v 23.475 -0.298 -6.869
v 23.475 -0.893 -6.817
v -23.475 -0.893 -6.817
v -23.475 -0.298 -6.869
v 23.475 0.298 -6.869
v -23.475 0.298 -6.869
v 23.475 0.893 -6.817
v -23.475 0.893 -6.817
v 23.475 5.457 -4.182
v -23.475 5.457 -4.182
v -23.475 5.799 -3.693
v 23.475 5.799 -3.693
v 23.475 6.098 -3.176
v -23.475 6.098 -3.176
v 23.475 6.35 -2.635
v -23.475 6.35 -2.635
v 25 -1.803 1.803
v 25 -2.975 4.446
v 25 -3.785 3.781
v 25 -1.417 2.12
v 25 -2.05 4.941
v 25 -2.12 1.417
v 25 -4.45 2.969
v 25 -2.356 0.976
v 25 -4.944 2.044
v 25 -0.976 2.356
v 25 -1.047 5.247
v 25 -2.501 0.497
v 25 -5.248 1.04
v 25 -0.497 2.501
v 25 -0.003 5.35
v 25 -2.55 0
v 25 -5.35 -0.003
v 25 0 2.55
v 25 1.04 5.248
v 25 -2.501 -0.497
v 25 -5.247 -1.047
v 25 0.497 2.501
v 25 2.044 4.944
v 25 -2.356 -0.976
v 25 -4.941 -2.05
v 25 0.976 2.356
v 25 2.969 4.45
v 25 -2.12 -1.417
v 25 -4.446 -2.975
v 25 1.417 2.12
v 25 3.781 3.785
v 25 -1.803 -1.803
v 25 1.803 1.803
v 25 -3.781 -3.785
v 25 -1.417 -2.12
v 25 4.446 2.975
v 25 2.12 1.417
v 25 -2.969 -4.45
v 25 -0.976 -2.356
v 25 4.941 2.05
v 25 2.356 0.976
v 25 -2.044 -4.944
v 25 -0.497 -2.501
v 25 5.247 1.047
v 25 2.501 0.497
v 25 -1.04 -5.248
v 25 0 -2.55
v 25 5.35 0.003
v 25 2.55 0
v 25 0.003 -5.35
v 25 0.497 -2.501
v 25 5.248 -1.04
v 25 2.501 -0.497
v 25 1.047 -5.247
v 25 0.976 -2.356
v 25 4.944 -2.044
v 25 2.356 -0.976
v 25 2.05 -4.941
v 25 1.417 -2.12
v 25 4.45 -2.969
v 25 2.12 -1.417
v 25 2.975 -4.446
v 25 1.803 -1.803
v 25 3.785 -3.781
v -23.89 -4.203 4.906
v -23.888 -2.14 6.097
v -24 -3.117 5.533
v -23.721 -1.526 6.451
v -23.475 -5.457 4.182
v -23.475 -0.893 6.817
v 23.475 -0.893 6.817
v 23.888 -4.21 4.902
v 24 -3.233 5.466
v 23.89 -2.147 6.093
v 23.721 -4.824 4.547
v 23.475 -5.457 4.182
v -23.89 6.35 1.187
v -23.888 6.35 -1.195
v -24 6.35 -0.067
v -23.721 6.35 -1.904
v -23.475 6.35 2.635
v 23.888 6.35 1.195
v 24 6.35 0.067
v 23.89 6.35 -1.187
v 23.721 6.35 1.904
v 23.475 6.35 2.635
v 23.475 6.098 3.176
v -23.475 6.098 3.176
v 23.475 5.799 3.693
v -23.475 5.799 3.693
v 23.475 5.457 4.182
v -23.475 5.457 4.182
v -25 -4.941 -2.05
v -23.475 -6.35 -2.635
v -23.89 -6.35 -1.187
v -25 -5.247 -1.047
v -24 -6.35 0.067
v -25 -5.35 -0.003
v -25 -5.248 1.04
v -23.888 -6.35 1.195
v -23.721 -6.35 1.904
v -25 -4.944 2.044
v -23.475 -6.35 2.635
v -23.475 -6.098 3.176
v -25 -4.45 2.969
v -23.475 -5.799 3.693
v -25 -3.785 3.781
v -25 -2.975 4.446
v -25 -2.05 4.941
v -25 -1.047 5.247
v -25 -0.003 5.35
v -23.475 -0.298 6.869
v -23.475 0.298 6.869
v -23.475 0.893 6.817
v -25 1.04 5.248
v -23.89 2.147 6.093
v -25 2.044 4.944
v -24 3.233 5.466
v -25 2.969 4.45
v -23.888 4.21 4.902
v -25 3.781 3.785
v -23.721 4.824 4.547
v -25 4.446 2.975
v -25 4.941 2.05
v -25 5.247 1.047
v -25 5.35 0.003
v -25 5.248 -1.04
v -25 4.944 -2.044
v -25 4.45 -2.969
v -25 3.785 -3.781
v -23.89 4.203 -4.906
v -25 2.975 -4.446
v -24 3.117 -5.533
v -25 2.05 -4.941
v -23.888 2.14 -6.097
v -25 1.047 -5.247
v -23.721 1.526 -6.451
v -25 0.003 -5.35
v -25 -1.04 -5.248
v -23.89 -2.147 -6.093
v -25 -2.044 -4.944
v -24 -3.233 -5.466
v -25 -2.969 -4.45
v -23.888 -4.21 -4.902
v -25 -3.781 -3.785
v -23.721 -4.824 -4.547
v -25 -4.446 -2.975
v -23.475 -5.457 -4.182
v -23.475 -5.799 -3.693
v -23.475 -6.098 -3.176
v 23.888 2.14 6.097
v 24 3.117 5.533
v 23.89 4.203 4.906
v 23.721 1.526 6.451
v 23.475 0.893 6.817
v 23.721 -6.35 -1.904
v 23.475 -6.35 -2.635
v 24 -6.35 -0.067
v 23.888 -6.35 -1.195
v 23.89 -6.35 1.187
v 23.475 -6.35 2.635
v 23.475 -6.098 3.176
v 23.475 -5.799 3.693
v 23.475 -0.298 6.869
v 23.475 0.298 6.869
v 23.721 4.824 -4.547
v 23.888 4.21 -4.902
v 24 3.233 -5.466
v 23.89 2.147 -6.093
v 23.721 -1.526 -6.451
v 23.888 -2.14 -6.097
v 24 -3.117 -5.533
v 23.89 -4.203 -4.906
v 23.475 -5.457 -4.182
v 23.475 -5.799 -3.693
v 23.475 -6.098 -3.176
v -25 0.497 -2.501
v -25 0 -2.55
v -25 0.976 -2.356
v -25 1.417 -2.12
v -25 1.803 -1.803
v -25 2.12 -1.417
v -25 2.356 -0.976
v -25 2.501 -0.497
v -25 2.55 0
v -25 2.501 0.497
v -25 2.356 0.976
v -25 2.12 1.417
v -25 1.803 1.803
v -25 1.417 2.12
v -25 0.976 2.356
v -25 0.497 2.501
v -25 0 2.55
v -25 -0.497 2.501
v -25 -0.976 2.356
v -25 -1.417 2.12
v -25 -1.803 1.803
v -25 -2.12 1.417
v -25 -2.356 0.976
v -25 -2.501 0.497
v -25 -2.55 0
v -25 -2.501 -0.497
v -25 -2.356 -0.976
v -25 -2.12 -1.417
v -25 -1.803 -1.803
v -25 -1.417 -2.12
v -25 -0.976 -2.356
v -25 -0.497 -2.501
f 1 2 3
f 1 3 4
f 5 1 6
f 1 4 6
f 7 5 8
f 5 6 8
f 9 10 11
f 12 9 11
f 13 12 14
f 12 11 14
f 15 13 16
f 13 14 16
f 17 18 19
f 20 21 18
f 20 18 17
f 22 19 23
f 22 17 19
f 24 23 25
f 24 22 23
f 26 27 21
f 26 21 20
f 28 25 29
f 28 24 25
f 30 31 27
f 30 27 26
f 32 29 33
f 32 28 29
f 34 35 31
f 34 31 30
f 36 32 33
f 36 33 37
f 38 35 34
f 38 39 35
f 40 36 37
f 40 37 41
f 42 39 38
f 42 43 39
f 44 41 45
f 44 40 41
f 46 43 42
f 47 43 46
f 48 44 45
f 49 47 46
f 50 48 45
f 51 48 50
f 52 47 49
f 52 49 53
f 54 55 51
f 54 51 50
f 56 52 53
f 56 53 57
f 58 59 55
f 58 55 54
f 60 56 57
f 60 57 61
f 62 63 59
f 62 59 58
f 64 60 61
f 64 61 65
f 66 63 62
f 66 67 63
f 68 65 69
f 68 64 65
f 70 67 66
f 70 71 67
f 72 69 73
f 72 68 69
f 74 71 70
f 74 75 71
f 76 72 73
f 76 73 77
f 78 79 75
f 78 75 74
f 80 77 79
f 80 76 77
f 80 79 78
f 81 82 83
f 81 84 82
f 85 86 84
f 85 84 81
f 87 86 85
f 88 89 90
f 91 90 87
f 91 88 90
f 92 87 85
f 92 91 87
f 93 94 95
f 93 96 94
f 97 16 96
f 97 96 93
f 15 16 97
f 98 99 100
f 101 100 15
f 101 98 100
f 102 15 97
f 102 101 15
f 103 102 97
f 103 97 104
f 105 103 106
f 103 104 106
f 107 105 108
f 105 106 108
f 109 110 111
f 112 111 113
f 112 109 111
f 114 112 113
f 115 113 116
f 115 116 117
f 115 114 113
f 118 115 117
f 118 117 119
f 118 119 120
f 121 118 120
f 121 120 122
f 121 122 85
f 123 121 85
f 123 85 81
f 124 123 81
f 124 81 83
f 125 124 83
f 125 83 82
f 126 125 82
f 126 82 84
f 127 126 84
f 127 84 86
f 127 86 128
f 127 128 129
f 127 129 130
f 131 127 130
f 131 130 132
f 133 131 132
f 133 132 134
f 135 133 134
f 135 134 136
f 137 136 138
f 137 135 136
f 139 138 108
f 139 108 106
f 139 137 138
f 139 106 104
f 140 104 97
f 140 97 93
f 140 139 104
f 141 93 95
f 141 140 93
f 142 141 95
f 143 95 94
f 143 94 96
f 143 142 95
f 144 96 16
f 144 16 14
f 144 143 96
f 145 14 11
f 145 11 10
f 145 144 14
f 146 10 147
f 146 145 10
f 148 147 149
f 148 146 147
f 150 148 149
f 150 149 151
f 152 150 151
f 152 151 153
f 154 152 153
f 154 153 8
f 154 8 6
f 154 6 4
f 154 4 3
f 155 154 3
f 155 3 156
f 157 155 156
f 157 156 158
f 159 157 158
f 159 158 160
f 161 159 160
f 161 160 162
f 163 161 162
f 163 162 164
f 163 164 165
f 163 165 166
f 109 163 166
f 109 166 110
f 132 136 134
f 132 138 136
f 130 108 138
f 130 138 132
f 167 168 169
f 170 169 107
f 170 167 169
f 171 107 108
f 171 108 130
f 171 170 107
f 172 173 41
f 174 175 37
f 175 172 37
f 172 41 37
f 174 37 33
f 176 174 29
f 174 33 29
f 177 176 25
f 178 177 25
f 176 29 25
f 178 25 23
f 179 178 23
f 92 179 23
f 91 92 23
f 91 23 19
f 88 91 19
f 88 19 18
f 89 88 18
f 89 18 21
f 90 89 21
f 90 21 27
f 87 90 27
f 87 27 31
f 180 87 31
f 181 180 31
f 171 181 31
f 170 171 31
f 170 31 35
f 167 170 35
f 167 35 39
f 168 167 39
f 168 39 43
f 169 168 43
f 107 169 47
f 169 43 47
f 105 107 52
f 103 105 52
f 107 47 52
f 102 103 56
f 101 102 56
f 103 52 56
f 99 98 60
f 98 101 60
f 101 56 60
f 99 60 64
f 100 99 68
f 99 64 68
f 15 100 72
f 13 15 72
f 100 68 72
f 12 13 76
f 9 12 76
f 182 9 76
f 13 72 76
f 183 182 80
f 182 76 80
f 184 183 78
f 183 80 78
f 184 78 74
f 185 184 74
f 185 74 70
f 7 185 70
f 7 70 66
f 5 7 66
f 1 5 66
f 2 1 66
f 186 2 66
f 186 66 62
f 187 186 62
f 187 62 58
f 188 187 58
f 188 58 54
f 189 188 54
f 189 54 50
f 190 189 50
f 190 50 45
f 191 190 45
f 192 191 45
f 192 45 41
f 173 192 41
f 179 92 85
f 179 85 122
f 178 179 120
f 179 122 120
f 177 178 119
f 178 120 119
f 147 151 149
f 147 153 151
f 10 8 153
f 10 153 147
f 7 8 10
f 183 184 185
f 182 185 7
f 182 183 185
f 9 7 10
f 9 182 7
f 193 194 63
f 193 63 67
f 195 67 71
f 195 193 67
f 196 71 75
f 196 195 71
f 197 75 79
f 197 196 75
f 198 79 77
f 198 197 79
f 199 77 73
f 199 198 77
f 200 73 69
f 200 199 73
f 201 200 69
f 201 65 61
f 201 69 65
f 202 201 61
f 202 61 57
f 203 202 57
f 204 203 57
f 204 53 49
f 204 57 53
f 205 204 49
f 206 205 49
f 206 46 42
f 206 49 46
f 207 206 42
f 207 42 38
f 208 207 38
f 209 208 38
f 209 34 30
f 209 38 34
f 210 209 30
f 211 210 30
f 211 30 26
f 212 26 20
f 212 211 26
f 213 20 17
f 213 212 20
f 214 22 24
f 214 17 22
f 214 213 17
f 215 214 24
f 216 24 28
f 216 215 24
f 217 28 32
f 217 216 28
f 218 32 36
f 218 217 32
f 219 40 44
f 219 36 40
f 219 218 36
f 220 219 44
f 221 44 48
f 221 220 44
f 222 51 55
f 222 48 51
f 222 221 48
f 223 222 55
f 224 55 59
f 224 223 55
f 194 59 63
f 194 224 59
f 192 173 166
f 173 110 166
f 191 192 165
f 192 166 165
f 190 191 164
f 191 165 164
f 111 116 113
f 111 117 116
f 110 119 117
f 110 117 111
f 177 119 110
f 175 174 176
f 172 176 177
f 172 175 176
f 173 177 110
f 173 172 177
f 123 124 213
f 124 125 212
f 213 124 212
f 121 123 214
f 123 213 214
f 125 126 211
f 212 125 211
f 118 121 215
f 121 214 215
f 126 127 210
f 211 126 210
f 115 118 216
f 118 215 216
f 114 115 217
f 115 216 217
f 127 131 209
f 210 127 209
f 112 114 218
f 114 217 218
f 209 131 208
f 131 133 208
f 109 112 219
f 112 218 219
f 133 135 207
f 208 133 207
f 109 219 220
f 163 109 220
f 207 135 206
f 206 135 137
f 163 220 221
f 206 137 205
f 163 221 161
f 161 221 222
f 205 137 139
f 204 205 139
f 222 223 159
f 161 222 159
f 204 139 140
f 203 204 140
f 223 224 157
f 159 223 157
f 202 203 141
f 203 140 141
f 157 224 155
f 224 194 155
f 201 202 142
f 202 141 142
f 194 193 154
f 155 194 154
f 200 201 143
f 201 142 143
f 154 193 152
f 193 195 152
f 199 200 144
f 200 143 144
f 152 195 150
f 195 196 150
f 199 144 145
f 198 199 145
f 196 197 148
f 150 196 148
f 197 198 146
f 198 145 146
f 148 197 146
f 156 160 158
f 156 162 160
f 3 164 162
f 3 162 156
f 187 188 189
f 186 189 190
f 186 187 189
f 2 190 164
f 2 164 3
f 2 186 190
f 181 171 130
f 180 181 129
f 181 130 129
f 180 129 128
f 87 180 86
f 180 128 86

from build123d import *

# Parameters (mm, degrees)
EXTRUDE_476_DEPTH          = 25
CUT_EXTRUDE_647_DEPTH      = 27.815775829
CUT_EXTRUDE_647_DEPTH_BACK = 27.815775829
SKETCH_8_R                 = 8.875
SKETCH_8_R_2               = 6.875
CUT_EXTRUDE_851_DEPTH      = 27.694346312
CUT_EXTRUDE_851_DEPTH_BACK = 27.694346312
SKETCH_9_R                 = 2.55


with BuildPart() as part:
    # 草图1 → Extrude 476 (new, symmetric)
    with BuildSketch(Plane(origin=(0, 0, 0), x_dir=(0, 0, -1), z_dir=(1, 0, 0))):
        Polygon((7.332348419, 0), (3.666174209, 6.35), (-3.666174209, 6.35), (-7.332348419, 0), (-3.666174209, -6.35), (3.666174209, -6.35), align=None)
    extrude(amount=EXTRUDE_476_DEPTH, both=True)

    # 草图8 → Cut-Extrude 647 (cut, two sides: drawn at the far end of the back side and taken through both)
    with BuildSketch(Plane(origin=(0, 0, 0), x_dir=(0, 0, -1), z_dir=(1, 0, 0)).offset(-CUT_EXTRUDE_647_DEPTH_BACK)):
        Circle(SKETCH_8_R)
        Circle(SKETCH_8_R_2, mode=Mode.SUBTRACT)
    extrude(amount=CUT_EXTRUDE_647_DEPTH + CUT_EXTRUDE_647_DEPTH_BACK, mode=Mode.SUBTRACT)

    # 草图9 → Cut-Extrude 851 (cut, two sides: drawn at the far end of the back side and taken through both)
    with BuildSketch(Plane(origin=(0, 0, 0), x_dir=(0, 0, -1), z_dir=(1, 0, 0)).offset(-CUT_EXTRUDE_851_DEPTH_BACK)):
        Circle(SKETCH_9_R)
    extrude(amount=CUT_EXTRUDE_851_DEPTH + CUT_EXTRUDE_851_DEPTH_BACK, mode=Mode.SUBTRACT)

    # 草图10 → Cut-Revolve 1145 (revolve, cut)
    with BuildSketch(Plane.XY, mode=Mode.PRIVATE) as cut_revolve_1145_sk:
        Polygon((-26, 7.35), (-23, 7.35), (-26, 4.35), align=None)
        Polygon((23, 7.35), (26, 4.35), (26, 7.35), align=None)
    revolve(cut_revolve_1145_sk.sketch.rotate(Axis((25, 0, 0), (-1, 0, 0)), 157.463629785), axis=Axis((25, 0, 0), (-1, 0, 0)), mode=Mode.SUBTRACT)


solid = part.part
